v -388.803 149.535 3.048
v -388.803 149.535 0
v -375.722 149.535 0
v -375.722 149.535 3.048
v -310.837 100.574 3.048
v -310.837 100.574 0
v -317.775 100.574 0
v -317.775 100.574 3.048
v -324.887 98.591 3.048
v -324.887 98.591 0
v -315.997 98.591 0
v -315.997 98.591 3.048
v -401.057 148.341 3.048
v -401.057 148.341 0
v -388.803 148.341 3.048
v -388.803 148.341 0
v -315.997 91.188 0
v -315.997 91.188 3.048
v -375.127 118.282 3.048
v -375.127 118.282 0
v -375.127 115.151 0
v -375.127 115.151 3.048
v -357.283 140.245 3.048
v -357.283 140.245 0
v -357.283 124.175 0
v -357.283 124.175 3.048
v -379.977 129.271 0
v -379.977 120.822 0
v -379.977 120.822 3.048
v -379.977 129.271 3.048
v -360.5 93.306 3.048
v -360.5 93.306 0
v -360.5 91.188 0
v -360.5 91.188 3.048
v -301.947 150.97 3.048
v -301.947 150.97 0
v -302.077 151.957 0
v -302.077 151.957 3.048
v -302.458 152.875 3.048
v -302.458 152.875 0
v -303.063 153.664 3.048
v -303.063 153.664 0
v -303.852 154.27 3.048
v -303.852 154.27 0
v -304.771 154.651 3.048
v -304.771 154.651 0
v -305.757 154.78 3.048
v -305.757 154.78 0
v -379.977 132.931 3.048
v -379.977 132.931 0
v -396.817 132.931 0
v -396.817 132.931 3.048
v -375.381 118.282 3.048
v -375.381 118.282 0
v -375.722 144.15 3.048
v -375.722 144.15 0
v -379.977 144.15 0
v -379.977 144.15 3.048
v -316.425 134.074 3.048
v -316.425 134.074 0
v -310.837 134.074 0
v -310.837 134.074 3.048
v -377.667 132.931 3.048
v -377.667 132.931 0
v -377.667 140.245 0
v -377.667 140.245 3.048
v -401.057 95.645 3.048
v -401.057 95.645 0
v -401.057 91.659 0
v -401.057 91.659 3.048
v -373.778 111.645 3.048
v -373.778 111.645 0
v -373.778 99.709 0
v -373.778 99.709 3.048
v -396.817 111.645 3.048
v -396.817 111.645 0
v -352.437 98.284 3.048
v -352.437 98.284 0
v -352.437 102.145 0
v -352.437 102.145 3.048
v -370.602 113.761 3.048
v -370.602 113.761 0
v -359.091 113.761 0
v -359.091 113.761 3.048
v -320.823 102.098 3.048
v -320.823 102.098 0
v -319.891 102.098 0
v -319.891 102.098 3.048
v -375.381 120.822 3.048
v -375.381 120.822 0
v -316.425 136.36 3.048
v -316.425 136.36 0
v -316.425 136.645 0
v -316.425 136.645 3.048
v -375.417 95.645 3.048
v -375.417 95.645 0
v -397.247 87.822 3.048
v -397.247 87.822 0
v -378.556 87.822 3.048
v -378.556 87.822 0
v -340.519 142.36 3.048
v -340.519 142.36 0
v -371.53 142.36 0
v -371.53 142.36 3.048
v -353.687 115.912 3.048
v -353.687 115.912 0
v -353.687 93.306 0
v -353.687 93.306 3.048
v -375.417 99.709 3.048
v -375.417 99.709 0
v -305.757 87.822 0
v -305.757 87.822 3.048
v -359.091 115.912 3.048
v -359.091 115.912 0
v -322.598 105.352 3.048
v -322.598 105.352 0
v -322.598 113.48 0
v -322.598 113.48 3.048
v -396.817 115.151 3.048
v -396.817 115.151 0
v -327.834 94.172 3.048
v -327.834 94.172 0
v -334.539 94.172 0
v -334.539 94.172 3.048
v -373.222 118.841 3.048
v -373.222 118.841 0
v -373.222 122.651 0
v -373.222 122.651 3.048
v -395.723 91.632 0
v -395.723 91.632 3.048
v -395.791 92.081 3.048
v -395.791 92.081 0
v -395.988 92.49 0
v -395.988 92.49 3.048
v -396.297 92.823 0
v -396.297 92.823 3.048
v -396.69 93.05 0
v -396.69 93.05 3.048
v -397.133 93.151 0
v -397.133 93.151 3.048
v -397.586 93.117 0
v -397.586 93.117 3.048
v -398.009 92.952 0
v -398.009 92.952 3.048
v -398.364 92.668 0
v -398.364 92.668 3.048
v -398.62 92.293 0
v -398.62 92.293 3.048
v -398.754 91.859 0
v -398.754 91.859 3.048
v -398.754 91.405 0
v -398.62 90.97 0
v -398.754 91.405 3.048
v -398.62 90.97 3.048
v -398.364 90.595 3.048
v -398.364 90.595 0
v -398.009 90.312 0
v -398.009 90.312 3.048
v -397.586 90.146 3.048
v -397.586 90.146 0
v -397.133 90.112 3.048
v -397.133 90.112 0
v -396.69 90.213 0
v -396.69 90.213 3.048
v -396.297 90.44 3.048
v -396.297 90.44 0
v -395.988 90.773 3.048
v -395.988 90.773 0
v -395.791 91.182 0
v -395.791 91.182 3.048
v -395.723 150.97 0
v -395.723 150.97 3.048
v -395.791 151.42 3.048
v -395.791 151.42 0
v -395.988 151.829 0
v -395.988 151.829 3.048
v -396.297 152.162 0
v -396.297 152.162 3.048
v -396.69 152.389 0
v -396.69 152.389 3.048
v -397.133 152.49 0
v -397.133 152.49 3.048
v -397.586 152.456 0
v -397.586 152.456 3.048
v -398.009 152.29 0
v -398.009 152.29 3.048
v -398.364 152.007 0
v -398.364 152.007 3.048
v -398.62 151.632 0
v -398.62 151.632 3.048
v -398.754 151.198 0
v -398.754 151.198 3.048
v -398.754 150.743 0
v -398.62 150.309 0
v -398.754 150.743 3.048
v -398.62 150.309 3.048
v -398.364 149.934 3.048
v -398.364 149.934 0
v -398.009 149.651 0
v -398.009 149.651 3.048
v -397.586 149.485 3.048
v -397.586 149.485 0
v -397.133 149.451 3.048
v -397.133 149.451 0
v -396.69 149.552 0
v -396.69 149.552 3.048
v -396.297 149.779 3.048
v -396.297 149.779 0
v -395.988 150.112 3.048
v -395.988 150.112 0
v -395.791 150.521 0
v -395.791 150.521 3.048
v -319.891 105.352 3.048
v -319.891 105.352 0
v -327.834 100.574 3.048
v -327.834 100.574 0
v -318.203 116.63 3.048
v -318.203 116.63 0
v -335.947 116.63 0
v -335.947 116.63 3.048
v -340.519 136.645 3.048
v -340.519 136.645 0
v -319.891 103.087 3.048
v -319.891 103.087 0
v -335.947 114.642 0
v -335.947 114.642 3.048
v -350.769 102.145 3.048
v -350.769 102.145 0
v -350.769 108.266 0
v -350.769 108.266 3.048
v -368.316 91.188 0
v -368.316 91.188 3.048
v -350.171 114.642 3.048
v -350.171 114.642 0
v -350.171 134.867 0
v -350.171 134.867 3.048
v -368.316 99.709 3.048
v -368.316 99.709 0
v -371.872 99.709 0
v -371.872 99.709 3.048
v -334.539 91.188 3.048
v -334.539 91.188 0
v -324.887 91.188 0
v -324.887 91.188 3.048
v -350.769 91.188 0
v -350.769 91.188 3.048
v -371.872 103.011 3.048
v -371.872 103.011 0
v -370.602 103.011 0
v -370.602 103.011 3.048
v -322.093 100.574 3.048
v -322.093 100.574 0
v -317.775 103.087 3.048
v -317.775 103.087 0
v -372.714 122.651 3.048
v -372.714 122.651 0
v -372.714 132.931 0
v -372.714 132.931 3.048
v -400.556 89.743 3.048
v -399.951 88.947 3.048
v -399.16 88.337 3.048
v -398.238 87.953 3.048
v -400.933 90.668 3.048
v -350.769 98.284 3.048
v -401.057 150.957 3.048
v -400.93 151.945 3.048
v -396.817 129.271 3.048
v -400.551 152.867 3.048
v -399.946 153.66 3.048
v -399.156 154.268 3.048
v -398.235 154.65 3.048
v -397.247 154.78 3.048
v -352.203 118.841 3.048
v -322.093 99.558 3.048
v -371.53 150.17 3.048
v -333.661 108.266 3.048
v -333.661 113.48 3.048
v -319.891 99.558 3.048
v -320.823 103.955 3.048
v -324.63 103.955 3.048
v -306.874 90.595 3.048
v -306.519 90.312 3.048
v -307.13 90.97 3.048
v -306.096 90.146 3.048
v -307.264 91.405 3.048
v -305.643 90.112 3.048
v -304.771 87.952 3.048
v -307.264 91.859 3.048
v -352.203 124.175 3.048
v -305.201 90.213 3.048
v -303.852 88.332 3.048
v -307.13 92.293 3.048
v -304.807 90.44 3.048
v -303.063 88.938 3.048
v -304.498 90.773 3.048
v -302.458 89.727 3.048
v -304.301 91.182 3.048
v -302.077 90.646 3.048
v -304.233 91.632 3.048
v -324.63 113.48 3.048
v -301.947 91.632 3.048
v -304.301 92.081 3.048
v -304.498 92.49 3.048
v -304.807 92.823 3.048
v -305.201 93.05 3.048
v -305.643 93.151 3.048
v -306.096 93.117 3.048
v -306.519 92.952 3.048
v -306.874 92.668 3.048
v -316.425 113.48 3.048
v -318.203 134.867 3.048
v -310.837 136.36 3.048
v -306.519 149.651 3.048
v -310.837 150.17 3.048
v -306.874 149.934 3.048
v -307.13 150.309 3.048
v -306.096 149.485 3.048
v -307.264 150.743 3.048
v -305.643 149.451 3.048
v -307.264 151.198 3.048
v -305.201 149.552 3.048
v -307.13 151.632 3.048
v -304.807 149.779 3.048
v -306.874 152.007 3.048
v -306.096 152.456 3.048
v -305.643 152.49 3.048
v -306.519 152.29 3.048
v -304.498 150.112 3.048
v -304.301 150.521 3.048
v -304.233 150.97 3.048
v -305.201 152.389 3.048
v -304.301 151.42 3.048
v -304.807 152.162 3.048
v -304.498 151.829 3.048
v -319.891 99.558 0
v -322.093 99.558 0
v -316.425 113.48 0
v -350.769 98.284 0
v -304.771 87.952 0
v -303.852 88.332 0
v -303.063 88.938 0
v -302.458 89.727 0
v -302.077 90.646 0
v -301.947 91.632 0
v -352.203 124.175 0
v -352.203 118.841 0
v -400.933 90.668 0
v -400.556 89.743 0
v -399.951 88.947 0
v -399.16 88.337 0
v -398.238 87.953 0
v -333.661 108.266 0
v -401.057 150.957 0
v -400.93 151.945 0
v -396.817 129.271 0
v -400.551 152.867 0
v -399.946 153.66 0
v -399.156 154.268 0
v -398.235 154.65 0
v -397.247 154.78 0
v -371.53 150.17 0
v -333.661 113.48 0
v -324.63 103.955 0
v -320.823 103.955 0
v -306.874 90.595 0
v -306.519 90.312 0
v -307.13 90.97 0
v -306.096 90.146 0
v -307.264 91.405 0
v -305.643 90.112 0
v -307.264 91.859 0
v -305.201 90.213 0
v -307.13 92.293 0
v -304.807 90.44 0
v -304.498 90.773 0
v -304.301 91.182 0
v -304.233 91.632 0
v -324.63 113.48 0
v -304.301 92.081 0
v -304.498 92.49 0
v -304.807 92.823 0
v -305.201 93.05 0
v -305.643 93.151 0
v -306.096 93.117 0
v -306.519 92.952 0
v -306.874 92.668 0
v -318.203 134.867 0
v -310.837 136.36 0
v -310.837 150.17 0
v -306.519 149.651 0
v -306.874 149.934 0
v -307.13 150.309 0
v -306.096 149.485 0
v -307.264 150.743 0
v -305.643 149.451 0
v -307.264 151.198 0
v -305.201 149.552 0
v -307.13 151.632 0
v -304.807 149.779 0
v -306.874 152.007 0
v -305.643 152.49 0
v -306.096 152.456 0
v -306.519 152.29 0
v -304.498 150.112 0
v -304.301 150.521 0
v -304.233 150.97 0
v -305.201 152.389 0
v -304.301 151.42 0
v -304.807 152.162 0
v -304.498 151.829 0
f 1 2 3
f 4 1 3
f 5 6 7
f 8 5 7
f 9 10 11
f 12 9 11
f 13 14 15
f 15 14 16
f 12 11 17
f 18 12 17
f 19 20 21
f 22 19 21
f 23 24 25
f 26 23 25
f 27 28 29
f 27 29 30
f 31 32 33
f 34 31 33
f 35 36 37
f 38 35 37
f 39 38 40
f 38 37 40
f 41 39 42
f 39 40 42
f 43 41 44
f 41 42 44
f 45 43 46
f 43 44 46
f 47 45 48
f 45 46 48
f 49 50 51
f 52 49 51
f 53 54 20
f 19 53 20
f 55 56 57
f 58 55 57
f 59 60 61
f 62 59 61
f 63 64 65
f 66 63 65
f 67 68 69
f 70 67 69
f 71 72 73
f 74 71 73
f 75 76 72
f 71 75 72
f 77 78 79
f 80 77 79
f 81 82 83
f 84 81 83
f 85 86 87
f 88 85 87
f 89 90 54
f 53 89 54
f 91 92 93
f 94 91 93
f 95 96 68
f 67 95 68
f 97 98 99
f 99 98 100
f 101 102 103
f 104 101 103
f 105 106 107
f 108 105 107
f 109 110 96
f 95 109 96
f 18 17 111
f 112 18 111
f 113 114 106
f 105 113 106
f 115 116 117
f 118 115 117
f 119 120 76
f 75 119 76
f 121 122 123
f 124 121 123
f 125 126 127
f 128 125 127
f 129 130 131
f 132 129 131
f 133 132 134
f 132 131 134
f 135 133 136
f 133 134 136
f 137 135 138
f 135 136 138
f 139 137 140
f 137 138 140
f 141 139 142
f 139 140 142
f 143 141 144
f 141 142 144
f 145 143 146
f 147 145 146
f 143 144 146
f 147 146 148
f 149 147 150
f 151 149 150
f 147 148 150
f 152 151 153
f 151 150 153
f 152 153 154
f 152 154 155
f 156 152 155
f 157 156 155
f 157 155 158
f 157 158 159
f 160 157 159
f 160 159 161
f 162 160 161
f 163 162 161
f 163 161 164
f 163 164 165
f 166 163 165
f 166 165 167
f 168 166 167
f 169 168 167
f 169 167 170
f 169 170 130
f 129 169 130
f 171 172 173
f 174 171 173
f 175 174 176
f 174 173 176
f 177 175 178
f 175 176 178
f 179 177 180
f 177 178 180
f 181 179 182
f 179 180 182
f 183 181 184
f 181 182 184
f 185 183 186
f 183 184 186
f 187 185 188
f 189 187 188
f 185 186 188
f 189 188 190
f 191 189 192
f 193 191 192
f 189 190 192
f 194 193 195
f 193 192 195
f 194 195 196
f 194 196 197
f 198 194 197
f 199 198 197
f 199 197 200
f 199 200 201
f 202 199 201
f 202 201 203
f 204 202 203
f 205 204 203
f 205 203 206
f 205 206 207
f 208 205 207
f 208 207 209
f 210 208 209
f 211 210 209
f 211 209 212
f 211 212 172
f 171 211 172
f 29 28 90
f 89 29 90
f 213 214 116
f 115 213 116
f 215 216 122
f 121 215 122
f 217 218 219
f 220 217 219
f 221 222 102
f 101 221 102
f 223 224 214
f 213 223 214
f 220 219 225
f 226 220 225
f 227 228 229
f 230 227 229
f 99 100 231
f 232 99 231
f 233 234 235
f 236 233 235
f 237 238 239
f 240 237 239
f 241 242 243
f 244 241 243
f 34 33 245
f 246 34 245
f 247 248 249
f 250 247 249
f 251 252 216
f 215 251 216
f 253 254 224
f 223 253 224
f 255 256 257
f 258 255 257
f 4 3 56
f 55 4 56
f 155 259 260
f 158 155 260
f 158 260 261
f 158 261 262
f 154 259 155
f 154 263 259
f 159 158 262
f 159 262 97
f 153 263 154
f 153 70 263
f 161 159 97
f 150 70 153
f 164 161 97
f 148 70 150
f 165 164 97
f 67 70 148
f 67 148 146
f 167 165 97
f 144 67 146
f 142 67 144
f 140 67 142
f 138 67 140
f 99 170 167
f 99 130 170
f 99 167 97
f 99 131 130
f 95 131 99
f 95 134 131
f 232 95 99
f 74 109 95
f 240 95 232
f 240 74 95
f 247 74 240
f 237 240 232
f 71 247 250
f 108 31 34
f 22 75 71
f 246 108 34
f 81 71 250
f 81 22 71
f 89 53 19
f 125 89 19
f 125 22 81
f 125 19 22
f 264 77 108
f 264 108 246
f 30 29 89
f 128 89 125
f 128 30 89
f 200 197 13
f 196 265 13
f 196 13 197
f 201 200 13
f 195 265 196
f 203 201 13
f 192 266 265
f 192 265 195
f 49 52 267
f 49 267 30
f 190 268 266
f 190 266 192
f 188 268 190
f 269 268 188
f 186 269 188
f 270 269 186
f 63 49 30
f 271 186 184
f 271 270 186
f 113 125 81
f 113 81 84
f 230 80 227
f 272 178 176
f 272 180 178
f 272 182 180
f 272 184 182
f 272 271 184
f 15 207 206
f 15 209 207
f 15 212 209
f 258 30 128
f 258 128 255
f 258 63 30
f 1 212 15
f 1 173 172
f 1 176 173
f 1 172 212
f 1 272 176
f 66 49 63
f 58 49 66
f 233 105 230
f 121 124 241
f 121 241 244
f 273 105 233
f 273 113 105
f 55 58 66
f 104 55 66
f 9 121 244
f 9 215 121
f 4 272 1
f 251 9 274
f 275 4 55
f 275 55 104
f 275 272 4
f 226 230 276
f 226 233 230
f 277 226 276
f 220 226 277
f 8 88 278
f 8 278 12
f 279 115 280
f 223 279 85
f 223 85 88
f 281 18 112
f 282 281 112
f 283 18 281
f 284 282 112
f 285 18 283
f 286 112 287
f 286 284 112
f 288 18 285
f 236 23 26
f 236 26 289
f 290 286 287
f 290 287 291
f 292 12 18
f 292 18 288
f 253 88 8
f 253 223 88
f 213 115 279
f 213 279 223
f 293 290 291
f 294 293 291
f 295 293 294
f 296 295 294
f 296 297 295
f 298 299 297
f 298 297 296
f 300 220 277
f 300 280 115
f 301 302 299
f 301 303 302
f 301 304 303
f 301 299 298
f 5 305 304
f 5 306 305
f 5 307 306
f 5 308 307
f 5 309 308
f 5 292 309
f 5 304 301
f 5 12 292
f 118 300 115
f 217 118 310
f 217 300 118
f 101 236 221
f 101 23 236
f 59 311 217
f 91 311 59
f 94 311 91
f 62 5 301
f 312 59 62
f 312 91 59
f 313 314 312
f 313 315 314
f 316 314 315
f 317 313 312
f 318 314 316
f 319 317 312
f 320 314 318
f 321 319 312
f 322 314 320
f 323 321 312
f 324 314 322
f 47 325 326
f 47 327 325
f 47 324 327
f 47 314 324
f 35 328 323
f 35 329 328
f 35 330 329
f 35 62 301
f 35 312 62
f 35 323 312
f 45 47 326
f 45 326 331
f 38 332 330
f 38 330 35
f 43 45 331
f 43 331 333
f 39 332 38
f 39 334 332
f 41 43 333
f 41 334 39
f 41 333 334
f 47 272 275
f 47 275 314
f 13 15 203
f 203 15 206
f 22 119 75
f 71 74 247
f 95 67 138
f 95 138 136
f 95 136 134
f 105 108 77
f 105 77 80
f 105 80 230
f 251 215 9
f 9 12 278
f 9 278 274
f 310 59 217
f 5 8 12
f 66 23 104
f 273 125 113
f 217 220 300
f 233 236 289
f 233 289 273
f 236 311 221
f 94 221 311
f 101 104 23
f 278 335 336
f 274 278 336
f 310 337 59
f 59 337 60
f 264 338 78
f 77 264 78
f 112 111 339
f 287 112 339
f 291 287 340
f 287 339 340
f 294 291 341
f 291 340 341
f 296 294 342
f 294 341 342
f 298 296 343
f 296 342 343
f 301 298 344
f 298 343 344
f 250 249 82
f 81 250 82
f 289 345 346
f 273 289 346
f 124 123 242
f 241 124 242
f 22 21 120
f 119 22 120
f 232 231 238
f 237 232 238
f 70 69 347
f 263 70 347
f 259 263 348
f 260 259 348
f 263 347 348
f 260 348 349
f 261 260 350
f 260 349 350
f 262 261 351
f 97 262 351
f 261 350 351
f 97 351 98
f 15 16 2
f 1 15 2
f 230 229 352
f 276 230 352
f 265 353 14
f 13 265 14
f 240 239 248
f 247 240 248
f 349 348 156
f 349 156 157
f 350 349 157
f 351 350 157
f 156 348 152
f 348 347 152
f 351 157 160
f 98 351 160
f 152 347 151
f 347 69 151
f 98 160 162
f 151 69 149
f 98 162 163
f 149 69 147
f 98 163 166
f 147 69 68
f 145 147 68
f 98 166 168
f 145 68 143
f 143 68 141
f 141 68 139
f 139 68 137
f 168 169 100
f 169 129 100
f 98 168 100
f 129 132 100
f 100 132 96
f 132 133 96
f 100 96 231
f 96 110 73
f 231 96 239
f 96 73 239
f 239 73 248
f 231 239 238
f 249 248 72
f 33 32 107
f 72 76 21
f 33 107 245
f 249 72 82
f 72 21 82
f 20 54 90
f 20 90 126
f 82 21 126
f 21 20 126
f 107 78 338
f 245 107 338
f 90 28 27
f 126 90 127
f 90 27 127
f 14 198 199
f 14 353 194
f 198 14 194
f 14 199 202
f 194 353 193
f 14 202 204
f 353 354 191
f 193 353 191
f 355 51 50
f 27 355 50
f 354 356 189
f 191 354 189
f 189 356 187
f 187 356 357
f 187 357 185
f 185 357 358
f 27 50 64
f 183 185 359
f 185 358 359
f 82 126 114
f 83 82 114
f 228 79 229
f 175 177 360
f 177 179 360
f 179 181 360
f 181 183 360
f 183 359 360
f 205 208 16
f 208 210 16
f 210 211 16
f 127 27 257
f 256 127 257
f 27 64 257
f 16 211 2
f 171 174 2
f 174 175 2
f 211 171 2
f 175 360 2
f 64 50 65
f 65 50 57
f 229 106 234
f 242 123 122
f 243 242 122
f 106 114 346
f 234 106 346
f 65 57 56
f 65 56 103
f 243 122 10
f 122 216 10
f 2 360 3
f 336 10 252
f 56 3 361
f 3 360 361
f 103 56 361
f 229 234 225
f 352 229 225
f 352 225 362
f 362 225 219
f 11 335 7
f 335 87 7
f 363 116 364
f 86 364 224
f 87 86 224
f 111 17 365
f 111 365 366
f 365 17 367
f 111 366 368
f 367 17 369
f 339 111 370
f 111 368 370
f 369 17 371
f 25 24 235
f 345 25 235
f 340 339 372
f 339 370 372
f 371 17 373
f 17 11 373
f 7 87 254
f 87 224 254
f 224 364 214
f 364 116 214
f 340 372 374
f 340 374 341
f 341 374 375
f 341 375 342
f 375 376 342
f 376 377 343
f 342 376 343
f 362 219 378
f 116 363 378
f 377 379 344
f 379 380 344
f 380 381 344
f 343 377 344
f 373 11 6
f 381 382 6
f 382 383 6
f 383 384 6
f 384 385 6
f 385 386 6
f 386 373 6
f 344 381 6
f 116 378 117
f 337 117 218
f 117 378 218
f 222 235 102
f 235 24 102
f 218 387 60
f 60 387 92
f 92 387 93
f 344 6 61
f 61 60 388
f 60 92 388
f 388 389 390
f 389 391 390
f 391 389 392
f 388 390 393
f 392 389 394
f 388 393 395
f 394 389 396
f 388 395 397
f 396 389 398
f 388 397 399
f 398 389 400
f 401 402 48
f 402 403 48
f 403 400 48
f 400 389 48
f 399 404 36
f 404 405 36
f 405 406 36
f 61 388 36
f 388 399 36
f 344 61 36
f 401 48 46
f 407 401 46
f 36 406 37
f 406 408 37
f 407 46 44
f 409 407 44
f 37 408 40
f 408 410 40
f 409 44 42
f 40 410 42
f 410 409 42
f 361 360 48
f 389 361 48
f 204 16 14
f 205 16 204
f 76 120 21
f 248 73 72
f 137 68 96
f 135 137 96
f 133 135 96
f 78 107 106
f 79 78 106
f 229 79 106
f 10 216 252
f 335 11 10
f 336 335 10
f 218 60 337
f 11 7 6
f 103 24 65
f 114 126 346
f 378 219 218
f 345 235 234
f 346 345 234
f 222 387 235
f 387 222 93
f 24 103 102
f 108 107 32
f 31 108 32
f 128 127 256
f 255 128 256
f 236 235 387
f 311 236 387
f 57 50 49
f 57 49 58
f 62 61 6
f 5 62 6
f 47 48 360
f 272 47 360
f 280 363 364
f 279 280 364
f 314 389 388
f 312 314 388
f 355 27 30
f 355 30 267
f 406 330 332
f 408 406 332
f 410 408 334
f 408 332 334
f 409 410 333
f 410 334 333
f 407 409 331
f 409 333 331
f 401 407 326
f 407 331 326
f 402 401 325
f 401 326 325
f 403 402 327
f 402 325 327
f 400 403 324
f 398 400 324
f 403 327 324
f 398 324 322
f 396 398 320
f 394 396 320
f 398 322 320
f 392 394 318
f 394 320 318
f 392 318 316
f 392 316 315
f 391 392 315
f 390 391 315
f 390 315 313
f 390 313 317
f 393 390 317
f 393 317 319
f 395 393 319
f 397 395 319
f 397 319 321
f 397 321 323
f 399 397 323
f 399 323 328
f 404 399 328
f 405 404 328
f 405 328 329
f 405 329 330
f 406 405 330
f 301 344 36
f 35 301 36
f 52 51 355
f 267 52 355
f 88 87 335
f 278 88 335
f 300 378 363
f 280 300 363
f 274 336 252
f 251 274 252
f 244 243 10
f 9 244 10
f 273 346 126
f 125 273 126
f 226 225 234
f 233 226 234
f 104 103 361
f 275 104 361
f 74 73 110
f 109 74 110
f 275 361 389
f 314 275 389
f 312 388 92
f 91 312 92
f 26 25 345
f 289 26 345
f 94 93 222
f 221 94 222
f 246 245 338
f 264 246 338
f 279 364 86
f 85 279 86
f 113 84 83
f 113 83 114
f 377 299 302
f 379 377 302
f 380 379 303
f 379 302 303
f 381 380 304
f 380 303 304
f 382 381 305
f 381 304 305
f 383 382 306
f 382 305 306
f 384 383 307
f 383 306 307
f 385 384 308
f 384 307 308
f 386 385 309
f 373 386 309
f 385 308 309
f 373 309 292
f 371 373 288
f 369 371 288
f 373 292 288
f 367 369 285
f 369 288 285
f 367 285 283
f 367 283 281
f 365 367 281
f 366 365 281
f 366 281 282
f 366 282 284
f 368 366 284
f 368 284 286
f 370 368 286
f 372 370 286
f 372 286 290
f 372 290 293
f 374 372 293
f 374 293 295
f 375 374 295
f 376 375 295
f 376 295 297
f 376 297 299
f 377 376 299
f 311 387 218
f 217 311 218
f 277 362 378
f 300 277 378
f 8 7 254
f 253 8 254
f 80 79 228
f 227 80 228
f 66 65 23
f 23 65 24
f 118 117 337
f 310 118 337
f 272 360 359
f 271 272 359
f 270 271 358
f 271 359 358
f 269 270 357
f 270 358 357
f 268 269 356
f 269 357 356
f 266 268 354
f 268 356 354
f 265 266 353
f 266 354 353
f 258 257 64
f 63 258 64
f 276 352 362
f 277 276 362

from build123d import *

# Parameters (mm, degrees)
BOSS_EXTRUDE1_OUTLINE_R = 1.3462
BOSS_EXTRUDE1_DEPTH     = 3.048
SKETCH14_W              = 2.2754
SKETCH14_H              = 2.1513
CUT_EXTRUDE2_DEPTH      = 430.898988368
SKETCH15_W              = 16.8402
SKETCH15_H              = 14.1197
SKETCH15_H_2            = 15.4101
CUT_EXTRUDE3_DEPTH      = 430.898988368
SKETCH16_R              = 1.524
CUT_EXTRUDE4_DEPTH      = 430.898988368


# Read off the part's stored shape, not the designer's step: Boss-Extrude1
with BuildPart() as part:
    # Boss-Extrude1 outline → Boss-Extrude1 (new body)
    with BuildSketch(Plane.XY):
        with BuildLine():
            ThreePointArc((-397.247125, 154.7804), (-399.946077222, 153.659592612), (-401.0571, 150.956597849))
            Line((-401.0571, 150.956597849), (-401.0571, 148.341))
            Line((-401.0571, 148.341), (-388.8032, 148.341))
            Line((-388.8032, 148.341), (-388.8032, 149.5347))
            Line((-388.8032, 149.5347), (-375.7222, 149.5347))
            Line((-375.7222, 149.5347), (-375.7222, 144.15))
            Line((-375.7222, 144.15), (-380.1672, 144.15))
            Line((-380.1672, 144.15), (-380.1672, 132.9309))
            Line((-380.1672, 132.9309), (-396.8172, 132.9309))
            Line((-396.8172, 132.9309), (-396.8172, 129.2706))
            Line((-396.8172, 129.2706), (-380.1672, 129.2706))
            Line((-380.1672, 129.2706), (-380.1672, 120.8224))
            Line((-380.1672, 120.8224), (-375.3812, 120.8224))
            Line((-375.3812, 120.8224), (-375.3812, 118.2824))
            Line((-375.3812, 118.2824), (-375.1272, 118.2824))
            Line((-375.1272, 118.2824), (-375.1272, 115.1509))
            Line((-375.1272, 115.1509), (-396.8172, 115.1509))
            Line((-396.8172, 115.1509), (-396.8172, 111.6447))
            Line((-396.8172, 111.6447), (-373.7775, 111.6447))
            Line((-373.7775, 111.6447), (-373.7775, 99.7089))
            Line((-373.7775, 99.7089), (-375.4172, 99.7089))
            Line((-375.4172, 99.7089), (-375.4172, 95.6449))
            Line((-375.4172, 95.6449), (-401.0571, 95.6449))
            Line((-401.0571, 95.6449), (-401.0571, 91.659304166))
            ThreePointArc((-401.0571, 91.659304166), (-399.951018769, 88.947400452), (-397.2472, 87.8217))
            Line((-397.2472, 87.8217), (-378.5565, 87.8217))
            Line((-378.5565, 87.8217), (-368.3165, 91.1883))
            Line((-368.3165, 91.1883), (-368.3165, 99.7089))
            Line((-368.3165, 99.7089), (-371.8725, 99.7089))
            Line((-371.8725, 99.7089), (-371.8725, 103.0109))
            Line((-371.8725, 103.0109), (-370.6025, 103.0109))
            Line((-370.6025, 103.0109), (-370.6025, 113.7612))
            Line((-370.6025, 113.7612), (-356.8152, 113.7612))
            Line((-356.8152, 113.7612), (-356.8152, 115.9125))
            Line((-356.8152, 115.9125), (-353.6872, 115.9125))
            Line((-353.6872, 115.9125), (-353.6872, 93.3059))
            Line((-353.6872, 93.3059), (-360.5003, 93.3059))
            Line((-360.5003, 93.3059), (-360.5003, 91.1883))
            Line((-360.5003, 91.1883), (-350.7686, 91.1883))
            Line((-350.7686, 91.1883), (-350.7686, 98.2843))
            Line((-350.7686, 98.2843), (-352.4372, 98.2843))
            Line((-352.4372, 98.2843), (-352.4372, 102.1451))
            Line((-352.4372, 102.1451), (-350.7686, 102.1451))
            Line((-350.7686, 102.1451), (-350.7686, 108.2665))
            Line((-350.7686, 108.2665), (-333.6613, 108.2665))
            Line((-333.6613, 108.2665), (-333.6613, 113.4801))
            Line((-333.6613, 113.4801), (-324.6295, 113.4801))
            Line((-324.6295, 113.4801), (-324.6295, 103.9551))
            Line((-324.6295, 103.9551), (-320.8233, 103.9551))
            Line((-320.8233, 103.9551), (-320.8233, 102.0978))
            Line((-320.8233, 102.0978), (-319.8913, 102.0978))
            Line((-319.8913, 102.0978), (-319.8913, 99.5578))
            Line((-319.8913, 99.5578), (-322.0933, 99.5578))
            Line((-322.0933, 99.5578), (-322.0933, 100.5738))
            Line((-322.0933, 100.5738), (-327.8337, 100.5738))
            Line((-327.8337, 100.5738), (-327.8337, 94.1717))
            Line((-327.8337, 94.1717), (-334.5393, 94.1717))
            Line((-334.5393, 94.1717), (-334.5393, 91.1883))
            Line((-334.5393, 91.1883), (-324.8873, 91.1883))
            Line((-324.8873, 91.1883), (-324.8873, 98.5911))
            Line((-324.8873, 98.5911), (-315.9973, 98.5911))
            Line((-315.9973, 98.5911), (-315.9973, 91.1883))
            Line((-315.9973, 91.1883), (-305.7573, 87.8217))
            ThreePointArc((-305.7573, 87.8217), (-303.063223164, 88.937623164), (-301.9473, 91.6317))
            Line((-301.9473, 91.6317), (-301.9473, 150.9704))
            ThreePointArc((-301.9473, 150.9704), (-303.063223164, 153.664476836), (-305.7573, 154.7804))
            Line((-305.7573, 154.7804), (-397.247125, 154.7804))
        make_face()
        with Locations((-397.2472, 91.6317)):
            Circle(BOSS_EXTRUDE1_OUTLINE_R, mode=Mode.SUBTRACT)
        with Locations((-305.7573, 91.6317)):
            Circle(BOSS_EXTRUDE1_OUTLINE_R, mode=Mode.SUBTRACT)
        Polygon((-322.5975, 105.3521), (-322.5975, 113.4801), (-316.4253, 113.4801), (-316.4253, 134.0739), (-310.8373, 134.0739), (-310.8373, 100.5738), (-317.7753, 100.5738), (-317.7753, 103.0869), (-319.8913, 103.0869), (-319.8913, 105.3521), align=None, mode=Mode.SUBTRACT)
        Polygon((-372.7142, 122.6512), (-372.7142, 132.9309), (-377.6672, 132.9309), (-377.6672, 140.2451), (-357.2832, 140.2451), (-357.2832, 124.1751), (-352.2032, 124.1751), (-352.2032, 118.8412), (-373.2222, 118.8412), (-373.2222, 122.6512), align=None, mode=Mode.SUBTRACT)
        with Locations((-397.247125, 150.9704)):
            Circle(BOSS_EXTRUDE1_OUTLINE_R, mode=Mode.SUBTRACT)
        Polygon((-335.9473, 116.6297), (-335.9473, 114.6425), (-350.1712, 114.6425), (-350.1712, 134.8668), (-318.2033, 134.8668), (-318.2033, 116.6297), align=None, mode=Mode.SUBTRACT)
        Polygon((-310.8374, 136.3599), (-316.4253, 136.3599), (-316.4253, 136.6448), (-340.5193, 136.6448), (-340.5193, 142.3597), (-371.5305, 142.3597), (-371.5305, 150.1697), (-310.8373, 150.1697), align=None, mode=Mode.SUBTRACT)
        with Locations((-305.7573, 150.9704)):
            Circle(BOSS_EXTRUDE1_OUTLINE_R, mode=Mode.SUBTRACT)
    extrude(amount=BOSS_EXTRUDE1_DEPTH)

    # Sketch14 → Cut-Extrude2 (cut, through all)
    with BuildSketch(Plane(origin=(0, 0, 0), x_dir=(-1, 0, 0), z_dir=(0, 0, -1))):
        with Locations((357.9529, 114.83685)):
            Rectangle(SKETCH14_W, SKETCH14_H)
    extrude(amount=-CUT_EXTRUDE2_DEPTH, mode=Mode.SUBTRACT)

    # Sketch15 → Cut-Extrude3 (cut, through all)
    with BuildSketch(Plane(origin=(0, 0, 0), x_dir=(-1, 0, 0), z_dir=(0, 0, -1))):
        with Locations((388.3971, 122.21075)):
            Rectangle(SKETCH15_W, SKETCH15_H)
        with Locations((388.3971, 140.63595)):
            Rectangle(SKETCH15_W, SKETCH15_H_2)
    extrude(amount=-CUT_EXTRUDE3_DEPTH, mode=Mode.SUBTRACT)

    # Sketch16 → Cut-Extrude4 (cut, through all)
    with BuildSketch(Plane.XY.offset(3.048)):
        with Locations((-397.247125, 150.9704)):
            Circle(SKETCH16_R)
        with Locations((-305.7573, 150.9704)):
            Circle(SKETCH16_R)
        with Locations((-305.7573, 91.6317)):
            Circle(SKETCH16_R)
        with Locations((-397.2472, 91.6317)):
            Circle(SKETCH16_R)
    extrude(amount=-CUT_EXTRUDE4_DEPTH, mode=Mode.SUBTRACT)


solid = part.part
